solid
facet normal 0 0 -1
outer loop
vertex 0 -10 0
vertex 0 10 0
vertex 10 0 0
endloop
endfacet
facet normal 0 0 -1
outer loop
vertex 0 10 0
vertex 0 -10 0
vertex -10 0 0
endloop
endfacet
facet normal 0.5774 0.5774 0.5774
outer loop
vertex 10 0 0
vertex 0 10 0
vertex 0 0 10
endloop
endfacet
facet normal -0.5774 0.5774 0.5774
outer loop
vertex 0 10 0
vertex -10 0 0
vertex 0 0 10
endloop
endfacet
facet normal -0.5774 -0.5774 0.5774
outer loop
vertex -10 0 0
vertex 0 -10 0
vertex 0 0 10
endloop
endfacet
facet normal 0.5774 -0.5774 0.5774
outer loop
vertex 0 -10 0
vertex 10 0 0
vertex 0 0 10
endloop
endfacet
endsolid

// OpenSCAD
echo(version = version());

polyhedron(
    points = [
        [10, 0, 0],
        [0, 10, 0],
        [-10, 0, 0],
        [0, -10, 0],
        [0, 0, 10]
    ],
    triangles = [
        [0, 1, 2, 3],
        [4, 1, 0],
        [4, 2, 1],
        [4, 3, 2],
        [4, 0, 3]
    ]
);

// Written by Clifford Wolf <clifford@clifford.at> and Marius
// Kintel <marius@kintel.net>
//
// To the extent possible under law, the author(s) have dedicated all
// copyright and related and neighboring rights to this software to the
// public domain worldwide. This software is distributed without any
// warranty.
//
// You should have received a copy of the CC0 Public Domain
// Dedication along with this software.
// If not, see <http://creativecommons.org/publicdomain/zero/1.0/>.
